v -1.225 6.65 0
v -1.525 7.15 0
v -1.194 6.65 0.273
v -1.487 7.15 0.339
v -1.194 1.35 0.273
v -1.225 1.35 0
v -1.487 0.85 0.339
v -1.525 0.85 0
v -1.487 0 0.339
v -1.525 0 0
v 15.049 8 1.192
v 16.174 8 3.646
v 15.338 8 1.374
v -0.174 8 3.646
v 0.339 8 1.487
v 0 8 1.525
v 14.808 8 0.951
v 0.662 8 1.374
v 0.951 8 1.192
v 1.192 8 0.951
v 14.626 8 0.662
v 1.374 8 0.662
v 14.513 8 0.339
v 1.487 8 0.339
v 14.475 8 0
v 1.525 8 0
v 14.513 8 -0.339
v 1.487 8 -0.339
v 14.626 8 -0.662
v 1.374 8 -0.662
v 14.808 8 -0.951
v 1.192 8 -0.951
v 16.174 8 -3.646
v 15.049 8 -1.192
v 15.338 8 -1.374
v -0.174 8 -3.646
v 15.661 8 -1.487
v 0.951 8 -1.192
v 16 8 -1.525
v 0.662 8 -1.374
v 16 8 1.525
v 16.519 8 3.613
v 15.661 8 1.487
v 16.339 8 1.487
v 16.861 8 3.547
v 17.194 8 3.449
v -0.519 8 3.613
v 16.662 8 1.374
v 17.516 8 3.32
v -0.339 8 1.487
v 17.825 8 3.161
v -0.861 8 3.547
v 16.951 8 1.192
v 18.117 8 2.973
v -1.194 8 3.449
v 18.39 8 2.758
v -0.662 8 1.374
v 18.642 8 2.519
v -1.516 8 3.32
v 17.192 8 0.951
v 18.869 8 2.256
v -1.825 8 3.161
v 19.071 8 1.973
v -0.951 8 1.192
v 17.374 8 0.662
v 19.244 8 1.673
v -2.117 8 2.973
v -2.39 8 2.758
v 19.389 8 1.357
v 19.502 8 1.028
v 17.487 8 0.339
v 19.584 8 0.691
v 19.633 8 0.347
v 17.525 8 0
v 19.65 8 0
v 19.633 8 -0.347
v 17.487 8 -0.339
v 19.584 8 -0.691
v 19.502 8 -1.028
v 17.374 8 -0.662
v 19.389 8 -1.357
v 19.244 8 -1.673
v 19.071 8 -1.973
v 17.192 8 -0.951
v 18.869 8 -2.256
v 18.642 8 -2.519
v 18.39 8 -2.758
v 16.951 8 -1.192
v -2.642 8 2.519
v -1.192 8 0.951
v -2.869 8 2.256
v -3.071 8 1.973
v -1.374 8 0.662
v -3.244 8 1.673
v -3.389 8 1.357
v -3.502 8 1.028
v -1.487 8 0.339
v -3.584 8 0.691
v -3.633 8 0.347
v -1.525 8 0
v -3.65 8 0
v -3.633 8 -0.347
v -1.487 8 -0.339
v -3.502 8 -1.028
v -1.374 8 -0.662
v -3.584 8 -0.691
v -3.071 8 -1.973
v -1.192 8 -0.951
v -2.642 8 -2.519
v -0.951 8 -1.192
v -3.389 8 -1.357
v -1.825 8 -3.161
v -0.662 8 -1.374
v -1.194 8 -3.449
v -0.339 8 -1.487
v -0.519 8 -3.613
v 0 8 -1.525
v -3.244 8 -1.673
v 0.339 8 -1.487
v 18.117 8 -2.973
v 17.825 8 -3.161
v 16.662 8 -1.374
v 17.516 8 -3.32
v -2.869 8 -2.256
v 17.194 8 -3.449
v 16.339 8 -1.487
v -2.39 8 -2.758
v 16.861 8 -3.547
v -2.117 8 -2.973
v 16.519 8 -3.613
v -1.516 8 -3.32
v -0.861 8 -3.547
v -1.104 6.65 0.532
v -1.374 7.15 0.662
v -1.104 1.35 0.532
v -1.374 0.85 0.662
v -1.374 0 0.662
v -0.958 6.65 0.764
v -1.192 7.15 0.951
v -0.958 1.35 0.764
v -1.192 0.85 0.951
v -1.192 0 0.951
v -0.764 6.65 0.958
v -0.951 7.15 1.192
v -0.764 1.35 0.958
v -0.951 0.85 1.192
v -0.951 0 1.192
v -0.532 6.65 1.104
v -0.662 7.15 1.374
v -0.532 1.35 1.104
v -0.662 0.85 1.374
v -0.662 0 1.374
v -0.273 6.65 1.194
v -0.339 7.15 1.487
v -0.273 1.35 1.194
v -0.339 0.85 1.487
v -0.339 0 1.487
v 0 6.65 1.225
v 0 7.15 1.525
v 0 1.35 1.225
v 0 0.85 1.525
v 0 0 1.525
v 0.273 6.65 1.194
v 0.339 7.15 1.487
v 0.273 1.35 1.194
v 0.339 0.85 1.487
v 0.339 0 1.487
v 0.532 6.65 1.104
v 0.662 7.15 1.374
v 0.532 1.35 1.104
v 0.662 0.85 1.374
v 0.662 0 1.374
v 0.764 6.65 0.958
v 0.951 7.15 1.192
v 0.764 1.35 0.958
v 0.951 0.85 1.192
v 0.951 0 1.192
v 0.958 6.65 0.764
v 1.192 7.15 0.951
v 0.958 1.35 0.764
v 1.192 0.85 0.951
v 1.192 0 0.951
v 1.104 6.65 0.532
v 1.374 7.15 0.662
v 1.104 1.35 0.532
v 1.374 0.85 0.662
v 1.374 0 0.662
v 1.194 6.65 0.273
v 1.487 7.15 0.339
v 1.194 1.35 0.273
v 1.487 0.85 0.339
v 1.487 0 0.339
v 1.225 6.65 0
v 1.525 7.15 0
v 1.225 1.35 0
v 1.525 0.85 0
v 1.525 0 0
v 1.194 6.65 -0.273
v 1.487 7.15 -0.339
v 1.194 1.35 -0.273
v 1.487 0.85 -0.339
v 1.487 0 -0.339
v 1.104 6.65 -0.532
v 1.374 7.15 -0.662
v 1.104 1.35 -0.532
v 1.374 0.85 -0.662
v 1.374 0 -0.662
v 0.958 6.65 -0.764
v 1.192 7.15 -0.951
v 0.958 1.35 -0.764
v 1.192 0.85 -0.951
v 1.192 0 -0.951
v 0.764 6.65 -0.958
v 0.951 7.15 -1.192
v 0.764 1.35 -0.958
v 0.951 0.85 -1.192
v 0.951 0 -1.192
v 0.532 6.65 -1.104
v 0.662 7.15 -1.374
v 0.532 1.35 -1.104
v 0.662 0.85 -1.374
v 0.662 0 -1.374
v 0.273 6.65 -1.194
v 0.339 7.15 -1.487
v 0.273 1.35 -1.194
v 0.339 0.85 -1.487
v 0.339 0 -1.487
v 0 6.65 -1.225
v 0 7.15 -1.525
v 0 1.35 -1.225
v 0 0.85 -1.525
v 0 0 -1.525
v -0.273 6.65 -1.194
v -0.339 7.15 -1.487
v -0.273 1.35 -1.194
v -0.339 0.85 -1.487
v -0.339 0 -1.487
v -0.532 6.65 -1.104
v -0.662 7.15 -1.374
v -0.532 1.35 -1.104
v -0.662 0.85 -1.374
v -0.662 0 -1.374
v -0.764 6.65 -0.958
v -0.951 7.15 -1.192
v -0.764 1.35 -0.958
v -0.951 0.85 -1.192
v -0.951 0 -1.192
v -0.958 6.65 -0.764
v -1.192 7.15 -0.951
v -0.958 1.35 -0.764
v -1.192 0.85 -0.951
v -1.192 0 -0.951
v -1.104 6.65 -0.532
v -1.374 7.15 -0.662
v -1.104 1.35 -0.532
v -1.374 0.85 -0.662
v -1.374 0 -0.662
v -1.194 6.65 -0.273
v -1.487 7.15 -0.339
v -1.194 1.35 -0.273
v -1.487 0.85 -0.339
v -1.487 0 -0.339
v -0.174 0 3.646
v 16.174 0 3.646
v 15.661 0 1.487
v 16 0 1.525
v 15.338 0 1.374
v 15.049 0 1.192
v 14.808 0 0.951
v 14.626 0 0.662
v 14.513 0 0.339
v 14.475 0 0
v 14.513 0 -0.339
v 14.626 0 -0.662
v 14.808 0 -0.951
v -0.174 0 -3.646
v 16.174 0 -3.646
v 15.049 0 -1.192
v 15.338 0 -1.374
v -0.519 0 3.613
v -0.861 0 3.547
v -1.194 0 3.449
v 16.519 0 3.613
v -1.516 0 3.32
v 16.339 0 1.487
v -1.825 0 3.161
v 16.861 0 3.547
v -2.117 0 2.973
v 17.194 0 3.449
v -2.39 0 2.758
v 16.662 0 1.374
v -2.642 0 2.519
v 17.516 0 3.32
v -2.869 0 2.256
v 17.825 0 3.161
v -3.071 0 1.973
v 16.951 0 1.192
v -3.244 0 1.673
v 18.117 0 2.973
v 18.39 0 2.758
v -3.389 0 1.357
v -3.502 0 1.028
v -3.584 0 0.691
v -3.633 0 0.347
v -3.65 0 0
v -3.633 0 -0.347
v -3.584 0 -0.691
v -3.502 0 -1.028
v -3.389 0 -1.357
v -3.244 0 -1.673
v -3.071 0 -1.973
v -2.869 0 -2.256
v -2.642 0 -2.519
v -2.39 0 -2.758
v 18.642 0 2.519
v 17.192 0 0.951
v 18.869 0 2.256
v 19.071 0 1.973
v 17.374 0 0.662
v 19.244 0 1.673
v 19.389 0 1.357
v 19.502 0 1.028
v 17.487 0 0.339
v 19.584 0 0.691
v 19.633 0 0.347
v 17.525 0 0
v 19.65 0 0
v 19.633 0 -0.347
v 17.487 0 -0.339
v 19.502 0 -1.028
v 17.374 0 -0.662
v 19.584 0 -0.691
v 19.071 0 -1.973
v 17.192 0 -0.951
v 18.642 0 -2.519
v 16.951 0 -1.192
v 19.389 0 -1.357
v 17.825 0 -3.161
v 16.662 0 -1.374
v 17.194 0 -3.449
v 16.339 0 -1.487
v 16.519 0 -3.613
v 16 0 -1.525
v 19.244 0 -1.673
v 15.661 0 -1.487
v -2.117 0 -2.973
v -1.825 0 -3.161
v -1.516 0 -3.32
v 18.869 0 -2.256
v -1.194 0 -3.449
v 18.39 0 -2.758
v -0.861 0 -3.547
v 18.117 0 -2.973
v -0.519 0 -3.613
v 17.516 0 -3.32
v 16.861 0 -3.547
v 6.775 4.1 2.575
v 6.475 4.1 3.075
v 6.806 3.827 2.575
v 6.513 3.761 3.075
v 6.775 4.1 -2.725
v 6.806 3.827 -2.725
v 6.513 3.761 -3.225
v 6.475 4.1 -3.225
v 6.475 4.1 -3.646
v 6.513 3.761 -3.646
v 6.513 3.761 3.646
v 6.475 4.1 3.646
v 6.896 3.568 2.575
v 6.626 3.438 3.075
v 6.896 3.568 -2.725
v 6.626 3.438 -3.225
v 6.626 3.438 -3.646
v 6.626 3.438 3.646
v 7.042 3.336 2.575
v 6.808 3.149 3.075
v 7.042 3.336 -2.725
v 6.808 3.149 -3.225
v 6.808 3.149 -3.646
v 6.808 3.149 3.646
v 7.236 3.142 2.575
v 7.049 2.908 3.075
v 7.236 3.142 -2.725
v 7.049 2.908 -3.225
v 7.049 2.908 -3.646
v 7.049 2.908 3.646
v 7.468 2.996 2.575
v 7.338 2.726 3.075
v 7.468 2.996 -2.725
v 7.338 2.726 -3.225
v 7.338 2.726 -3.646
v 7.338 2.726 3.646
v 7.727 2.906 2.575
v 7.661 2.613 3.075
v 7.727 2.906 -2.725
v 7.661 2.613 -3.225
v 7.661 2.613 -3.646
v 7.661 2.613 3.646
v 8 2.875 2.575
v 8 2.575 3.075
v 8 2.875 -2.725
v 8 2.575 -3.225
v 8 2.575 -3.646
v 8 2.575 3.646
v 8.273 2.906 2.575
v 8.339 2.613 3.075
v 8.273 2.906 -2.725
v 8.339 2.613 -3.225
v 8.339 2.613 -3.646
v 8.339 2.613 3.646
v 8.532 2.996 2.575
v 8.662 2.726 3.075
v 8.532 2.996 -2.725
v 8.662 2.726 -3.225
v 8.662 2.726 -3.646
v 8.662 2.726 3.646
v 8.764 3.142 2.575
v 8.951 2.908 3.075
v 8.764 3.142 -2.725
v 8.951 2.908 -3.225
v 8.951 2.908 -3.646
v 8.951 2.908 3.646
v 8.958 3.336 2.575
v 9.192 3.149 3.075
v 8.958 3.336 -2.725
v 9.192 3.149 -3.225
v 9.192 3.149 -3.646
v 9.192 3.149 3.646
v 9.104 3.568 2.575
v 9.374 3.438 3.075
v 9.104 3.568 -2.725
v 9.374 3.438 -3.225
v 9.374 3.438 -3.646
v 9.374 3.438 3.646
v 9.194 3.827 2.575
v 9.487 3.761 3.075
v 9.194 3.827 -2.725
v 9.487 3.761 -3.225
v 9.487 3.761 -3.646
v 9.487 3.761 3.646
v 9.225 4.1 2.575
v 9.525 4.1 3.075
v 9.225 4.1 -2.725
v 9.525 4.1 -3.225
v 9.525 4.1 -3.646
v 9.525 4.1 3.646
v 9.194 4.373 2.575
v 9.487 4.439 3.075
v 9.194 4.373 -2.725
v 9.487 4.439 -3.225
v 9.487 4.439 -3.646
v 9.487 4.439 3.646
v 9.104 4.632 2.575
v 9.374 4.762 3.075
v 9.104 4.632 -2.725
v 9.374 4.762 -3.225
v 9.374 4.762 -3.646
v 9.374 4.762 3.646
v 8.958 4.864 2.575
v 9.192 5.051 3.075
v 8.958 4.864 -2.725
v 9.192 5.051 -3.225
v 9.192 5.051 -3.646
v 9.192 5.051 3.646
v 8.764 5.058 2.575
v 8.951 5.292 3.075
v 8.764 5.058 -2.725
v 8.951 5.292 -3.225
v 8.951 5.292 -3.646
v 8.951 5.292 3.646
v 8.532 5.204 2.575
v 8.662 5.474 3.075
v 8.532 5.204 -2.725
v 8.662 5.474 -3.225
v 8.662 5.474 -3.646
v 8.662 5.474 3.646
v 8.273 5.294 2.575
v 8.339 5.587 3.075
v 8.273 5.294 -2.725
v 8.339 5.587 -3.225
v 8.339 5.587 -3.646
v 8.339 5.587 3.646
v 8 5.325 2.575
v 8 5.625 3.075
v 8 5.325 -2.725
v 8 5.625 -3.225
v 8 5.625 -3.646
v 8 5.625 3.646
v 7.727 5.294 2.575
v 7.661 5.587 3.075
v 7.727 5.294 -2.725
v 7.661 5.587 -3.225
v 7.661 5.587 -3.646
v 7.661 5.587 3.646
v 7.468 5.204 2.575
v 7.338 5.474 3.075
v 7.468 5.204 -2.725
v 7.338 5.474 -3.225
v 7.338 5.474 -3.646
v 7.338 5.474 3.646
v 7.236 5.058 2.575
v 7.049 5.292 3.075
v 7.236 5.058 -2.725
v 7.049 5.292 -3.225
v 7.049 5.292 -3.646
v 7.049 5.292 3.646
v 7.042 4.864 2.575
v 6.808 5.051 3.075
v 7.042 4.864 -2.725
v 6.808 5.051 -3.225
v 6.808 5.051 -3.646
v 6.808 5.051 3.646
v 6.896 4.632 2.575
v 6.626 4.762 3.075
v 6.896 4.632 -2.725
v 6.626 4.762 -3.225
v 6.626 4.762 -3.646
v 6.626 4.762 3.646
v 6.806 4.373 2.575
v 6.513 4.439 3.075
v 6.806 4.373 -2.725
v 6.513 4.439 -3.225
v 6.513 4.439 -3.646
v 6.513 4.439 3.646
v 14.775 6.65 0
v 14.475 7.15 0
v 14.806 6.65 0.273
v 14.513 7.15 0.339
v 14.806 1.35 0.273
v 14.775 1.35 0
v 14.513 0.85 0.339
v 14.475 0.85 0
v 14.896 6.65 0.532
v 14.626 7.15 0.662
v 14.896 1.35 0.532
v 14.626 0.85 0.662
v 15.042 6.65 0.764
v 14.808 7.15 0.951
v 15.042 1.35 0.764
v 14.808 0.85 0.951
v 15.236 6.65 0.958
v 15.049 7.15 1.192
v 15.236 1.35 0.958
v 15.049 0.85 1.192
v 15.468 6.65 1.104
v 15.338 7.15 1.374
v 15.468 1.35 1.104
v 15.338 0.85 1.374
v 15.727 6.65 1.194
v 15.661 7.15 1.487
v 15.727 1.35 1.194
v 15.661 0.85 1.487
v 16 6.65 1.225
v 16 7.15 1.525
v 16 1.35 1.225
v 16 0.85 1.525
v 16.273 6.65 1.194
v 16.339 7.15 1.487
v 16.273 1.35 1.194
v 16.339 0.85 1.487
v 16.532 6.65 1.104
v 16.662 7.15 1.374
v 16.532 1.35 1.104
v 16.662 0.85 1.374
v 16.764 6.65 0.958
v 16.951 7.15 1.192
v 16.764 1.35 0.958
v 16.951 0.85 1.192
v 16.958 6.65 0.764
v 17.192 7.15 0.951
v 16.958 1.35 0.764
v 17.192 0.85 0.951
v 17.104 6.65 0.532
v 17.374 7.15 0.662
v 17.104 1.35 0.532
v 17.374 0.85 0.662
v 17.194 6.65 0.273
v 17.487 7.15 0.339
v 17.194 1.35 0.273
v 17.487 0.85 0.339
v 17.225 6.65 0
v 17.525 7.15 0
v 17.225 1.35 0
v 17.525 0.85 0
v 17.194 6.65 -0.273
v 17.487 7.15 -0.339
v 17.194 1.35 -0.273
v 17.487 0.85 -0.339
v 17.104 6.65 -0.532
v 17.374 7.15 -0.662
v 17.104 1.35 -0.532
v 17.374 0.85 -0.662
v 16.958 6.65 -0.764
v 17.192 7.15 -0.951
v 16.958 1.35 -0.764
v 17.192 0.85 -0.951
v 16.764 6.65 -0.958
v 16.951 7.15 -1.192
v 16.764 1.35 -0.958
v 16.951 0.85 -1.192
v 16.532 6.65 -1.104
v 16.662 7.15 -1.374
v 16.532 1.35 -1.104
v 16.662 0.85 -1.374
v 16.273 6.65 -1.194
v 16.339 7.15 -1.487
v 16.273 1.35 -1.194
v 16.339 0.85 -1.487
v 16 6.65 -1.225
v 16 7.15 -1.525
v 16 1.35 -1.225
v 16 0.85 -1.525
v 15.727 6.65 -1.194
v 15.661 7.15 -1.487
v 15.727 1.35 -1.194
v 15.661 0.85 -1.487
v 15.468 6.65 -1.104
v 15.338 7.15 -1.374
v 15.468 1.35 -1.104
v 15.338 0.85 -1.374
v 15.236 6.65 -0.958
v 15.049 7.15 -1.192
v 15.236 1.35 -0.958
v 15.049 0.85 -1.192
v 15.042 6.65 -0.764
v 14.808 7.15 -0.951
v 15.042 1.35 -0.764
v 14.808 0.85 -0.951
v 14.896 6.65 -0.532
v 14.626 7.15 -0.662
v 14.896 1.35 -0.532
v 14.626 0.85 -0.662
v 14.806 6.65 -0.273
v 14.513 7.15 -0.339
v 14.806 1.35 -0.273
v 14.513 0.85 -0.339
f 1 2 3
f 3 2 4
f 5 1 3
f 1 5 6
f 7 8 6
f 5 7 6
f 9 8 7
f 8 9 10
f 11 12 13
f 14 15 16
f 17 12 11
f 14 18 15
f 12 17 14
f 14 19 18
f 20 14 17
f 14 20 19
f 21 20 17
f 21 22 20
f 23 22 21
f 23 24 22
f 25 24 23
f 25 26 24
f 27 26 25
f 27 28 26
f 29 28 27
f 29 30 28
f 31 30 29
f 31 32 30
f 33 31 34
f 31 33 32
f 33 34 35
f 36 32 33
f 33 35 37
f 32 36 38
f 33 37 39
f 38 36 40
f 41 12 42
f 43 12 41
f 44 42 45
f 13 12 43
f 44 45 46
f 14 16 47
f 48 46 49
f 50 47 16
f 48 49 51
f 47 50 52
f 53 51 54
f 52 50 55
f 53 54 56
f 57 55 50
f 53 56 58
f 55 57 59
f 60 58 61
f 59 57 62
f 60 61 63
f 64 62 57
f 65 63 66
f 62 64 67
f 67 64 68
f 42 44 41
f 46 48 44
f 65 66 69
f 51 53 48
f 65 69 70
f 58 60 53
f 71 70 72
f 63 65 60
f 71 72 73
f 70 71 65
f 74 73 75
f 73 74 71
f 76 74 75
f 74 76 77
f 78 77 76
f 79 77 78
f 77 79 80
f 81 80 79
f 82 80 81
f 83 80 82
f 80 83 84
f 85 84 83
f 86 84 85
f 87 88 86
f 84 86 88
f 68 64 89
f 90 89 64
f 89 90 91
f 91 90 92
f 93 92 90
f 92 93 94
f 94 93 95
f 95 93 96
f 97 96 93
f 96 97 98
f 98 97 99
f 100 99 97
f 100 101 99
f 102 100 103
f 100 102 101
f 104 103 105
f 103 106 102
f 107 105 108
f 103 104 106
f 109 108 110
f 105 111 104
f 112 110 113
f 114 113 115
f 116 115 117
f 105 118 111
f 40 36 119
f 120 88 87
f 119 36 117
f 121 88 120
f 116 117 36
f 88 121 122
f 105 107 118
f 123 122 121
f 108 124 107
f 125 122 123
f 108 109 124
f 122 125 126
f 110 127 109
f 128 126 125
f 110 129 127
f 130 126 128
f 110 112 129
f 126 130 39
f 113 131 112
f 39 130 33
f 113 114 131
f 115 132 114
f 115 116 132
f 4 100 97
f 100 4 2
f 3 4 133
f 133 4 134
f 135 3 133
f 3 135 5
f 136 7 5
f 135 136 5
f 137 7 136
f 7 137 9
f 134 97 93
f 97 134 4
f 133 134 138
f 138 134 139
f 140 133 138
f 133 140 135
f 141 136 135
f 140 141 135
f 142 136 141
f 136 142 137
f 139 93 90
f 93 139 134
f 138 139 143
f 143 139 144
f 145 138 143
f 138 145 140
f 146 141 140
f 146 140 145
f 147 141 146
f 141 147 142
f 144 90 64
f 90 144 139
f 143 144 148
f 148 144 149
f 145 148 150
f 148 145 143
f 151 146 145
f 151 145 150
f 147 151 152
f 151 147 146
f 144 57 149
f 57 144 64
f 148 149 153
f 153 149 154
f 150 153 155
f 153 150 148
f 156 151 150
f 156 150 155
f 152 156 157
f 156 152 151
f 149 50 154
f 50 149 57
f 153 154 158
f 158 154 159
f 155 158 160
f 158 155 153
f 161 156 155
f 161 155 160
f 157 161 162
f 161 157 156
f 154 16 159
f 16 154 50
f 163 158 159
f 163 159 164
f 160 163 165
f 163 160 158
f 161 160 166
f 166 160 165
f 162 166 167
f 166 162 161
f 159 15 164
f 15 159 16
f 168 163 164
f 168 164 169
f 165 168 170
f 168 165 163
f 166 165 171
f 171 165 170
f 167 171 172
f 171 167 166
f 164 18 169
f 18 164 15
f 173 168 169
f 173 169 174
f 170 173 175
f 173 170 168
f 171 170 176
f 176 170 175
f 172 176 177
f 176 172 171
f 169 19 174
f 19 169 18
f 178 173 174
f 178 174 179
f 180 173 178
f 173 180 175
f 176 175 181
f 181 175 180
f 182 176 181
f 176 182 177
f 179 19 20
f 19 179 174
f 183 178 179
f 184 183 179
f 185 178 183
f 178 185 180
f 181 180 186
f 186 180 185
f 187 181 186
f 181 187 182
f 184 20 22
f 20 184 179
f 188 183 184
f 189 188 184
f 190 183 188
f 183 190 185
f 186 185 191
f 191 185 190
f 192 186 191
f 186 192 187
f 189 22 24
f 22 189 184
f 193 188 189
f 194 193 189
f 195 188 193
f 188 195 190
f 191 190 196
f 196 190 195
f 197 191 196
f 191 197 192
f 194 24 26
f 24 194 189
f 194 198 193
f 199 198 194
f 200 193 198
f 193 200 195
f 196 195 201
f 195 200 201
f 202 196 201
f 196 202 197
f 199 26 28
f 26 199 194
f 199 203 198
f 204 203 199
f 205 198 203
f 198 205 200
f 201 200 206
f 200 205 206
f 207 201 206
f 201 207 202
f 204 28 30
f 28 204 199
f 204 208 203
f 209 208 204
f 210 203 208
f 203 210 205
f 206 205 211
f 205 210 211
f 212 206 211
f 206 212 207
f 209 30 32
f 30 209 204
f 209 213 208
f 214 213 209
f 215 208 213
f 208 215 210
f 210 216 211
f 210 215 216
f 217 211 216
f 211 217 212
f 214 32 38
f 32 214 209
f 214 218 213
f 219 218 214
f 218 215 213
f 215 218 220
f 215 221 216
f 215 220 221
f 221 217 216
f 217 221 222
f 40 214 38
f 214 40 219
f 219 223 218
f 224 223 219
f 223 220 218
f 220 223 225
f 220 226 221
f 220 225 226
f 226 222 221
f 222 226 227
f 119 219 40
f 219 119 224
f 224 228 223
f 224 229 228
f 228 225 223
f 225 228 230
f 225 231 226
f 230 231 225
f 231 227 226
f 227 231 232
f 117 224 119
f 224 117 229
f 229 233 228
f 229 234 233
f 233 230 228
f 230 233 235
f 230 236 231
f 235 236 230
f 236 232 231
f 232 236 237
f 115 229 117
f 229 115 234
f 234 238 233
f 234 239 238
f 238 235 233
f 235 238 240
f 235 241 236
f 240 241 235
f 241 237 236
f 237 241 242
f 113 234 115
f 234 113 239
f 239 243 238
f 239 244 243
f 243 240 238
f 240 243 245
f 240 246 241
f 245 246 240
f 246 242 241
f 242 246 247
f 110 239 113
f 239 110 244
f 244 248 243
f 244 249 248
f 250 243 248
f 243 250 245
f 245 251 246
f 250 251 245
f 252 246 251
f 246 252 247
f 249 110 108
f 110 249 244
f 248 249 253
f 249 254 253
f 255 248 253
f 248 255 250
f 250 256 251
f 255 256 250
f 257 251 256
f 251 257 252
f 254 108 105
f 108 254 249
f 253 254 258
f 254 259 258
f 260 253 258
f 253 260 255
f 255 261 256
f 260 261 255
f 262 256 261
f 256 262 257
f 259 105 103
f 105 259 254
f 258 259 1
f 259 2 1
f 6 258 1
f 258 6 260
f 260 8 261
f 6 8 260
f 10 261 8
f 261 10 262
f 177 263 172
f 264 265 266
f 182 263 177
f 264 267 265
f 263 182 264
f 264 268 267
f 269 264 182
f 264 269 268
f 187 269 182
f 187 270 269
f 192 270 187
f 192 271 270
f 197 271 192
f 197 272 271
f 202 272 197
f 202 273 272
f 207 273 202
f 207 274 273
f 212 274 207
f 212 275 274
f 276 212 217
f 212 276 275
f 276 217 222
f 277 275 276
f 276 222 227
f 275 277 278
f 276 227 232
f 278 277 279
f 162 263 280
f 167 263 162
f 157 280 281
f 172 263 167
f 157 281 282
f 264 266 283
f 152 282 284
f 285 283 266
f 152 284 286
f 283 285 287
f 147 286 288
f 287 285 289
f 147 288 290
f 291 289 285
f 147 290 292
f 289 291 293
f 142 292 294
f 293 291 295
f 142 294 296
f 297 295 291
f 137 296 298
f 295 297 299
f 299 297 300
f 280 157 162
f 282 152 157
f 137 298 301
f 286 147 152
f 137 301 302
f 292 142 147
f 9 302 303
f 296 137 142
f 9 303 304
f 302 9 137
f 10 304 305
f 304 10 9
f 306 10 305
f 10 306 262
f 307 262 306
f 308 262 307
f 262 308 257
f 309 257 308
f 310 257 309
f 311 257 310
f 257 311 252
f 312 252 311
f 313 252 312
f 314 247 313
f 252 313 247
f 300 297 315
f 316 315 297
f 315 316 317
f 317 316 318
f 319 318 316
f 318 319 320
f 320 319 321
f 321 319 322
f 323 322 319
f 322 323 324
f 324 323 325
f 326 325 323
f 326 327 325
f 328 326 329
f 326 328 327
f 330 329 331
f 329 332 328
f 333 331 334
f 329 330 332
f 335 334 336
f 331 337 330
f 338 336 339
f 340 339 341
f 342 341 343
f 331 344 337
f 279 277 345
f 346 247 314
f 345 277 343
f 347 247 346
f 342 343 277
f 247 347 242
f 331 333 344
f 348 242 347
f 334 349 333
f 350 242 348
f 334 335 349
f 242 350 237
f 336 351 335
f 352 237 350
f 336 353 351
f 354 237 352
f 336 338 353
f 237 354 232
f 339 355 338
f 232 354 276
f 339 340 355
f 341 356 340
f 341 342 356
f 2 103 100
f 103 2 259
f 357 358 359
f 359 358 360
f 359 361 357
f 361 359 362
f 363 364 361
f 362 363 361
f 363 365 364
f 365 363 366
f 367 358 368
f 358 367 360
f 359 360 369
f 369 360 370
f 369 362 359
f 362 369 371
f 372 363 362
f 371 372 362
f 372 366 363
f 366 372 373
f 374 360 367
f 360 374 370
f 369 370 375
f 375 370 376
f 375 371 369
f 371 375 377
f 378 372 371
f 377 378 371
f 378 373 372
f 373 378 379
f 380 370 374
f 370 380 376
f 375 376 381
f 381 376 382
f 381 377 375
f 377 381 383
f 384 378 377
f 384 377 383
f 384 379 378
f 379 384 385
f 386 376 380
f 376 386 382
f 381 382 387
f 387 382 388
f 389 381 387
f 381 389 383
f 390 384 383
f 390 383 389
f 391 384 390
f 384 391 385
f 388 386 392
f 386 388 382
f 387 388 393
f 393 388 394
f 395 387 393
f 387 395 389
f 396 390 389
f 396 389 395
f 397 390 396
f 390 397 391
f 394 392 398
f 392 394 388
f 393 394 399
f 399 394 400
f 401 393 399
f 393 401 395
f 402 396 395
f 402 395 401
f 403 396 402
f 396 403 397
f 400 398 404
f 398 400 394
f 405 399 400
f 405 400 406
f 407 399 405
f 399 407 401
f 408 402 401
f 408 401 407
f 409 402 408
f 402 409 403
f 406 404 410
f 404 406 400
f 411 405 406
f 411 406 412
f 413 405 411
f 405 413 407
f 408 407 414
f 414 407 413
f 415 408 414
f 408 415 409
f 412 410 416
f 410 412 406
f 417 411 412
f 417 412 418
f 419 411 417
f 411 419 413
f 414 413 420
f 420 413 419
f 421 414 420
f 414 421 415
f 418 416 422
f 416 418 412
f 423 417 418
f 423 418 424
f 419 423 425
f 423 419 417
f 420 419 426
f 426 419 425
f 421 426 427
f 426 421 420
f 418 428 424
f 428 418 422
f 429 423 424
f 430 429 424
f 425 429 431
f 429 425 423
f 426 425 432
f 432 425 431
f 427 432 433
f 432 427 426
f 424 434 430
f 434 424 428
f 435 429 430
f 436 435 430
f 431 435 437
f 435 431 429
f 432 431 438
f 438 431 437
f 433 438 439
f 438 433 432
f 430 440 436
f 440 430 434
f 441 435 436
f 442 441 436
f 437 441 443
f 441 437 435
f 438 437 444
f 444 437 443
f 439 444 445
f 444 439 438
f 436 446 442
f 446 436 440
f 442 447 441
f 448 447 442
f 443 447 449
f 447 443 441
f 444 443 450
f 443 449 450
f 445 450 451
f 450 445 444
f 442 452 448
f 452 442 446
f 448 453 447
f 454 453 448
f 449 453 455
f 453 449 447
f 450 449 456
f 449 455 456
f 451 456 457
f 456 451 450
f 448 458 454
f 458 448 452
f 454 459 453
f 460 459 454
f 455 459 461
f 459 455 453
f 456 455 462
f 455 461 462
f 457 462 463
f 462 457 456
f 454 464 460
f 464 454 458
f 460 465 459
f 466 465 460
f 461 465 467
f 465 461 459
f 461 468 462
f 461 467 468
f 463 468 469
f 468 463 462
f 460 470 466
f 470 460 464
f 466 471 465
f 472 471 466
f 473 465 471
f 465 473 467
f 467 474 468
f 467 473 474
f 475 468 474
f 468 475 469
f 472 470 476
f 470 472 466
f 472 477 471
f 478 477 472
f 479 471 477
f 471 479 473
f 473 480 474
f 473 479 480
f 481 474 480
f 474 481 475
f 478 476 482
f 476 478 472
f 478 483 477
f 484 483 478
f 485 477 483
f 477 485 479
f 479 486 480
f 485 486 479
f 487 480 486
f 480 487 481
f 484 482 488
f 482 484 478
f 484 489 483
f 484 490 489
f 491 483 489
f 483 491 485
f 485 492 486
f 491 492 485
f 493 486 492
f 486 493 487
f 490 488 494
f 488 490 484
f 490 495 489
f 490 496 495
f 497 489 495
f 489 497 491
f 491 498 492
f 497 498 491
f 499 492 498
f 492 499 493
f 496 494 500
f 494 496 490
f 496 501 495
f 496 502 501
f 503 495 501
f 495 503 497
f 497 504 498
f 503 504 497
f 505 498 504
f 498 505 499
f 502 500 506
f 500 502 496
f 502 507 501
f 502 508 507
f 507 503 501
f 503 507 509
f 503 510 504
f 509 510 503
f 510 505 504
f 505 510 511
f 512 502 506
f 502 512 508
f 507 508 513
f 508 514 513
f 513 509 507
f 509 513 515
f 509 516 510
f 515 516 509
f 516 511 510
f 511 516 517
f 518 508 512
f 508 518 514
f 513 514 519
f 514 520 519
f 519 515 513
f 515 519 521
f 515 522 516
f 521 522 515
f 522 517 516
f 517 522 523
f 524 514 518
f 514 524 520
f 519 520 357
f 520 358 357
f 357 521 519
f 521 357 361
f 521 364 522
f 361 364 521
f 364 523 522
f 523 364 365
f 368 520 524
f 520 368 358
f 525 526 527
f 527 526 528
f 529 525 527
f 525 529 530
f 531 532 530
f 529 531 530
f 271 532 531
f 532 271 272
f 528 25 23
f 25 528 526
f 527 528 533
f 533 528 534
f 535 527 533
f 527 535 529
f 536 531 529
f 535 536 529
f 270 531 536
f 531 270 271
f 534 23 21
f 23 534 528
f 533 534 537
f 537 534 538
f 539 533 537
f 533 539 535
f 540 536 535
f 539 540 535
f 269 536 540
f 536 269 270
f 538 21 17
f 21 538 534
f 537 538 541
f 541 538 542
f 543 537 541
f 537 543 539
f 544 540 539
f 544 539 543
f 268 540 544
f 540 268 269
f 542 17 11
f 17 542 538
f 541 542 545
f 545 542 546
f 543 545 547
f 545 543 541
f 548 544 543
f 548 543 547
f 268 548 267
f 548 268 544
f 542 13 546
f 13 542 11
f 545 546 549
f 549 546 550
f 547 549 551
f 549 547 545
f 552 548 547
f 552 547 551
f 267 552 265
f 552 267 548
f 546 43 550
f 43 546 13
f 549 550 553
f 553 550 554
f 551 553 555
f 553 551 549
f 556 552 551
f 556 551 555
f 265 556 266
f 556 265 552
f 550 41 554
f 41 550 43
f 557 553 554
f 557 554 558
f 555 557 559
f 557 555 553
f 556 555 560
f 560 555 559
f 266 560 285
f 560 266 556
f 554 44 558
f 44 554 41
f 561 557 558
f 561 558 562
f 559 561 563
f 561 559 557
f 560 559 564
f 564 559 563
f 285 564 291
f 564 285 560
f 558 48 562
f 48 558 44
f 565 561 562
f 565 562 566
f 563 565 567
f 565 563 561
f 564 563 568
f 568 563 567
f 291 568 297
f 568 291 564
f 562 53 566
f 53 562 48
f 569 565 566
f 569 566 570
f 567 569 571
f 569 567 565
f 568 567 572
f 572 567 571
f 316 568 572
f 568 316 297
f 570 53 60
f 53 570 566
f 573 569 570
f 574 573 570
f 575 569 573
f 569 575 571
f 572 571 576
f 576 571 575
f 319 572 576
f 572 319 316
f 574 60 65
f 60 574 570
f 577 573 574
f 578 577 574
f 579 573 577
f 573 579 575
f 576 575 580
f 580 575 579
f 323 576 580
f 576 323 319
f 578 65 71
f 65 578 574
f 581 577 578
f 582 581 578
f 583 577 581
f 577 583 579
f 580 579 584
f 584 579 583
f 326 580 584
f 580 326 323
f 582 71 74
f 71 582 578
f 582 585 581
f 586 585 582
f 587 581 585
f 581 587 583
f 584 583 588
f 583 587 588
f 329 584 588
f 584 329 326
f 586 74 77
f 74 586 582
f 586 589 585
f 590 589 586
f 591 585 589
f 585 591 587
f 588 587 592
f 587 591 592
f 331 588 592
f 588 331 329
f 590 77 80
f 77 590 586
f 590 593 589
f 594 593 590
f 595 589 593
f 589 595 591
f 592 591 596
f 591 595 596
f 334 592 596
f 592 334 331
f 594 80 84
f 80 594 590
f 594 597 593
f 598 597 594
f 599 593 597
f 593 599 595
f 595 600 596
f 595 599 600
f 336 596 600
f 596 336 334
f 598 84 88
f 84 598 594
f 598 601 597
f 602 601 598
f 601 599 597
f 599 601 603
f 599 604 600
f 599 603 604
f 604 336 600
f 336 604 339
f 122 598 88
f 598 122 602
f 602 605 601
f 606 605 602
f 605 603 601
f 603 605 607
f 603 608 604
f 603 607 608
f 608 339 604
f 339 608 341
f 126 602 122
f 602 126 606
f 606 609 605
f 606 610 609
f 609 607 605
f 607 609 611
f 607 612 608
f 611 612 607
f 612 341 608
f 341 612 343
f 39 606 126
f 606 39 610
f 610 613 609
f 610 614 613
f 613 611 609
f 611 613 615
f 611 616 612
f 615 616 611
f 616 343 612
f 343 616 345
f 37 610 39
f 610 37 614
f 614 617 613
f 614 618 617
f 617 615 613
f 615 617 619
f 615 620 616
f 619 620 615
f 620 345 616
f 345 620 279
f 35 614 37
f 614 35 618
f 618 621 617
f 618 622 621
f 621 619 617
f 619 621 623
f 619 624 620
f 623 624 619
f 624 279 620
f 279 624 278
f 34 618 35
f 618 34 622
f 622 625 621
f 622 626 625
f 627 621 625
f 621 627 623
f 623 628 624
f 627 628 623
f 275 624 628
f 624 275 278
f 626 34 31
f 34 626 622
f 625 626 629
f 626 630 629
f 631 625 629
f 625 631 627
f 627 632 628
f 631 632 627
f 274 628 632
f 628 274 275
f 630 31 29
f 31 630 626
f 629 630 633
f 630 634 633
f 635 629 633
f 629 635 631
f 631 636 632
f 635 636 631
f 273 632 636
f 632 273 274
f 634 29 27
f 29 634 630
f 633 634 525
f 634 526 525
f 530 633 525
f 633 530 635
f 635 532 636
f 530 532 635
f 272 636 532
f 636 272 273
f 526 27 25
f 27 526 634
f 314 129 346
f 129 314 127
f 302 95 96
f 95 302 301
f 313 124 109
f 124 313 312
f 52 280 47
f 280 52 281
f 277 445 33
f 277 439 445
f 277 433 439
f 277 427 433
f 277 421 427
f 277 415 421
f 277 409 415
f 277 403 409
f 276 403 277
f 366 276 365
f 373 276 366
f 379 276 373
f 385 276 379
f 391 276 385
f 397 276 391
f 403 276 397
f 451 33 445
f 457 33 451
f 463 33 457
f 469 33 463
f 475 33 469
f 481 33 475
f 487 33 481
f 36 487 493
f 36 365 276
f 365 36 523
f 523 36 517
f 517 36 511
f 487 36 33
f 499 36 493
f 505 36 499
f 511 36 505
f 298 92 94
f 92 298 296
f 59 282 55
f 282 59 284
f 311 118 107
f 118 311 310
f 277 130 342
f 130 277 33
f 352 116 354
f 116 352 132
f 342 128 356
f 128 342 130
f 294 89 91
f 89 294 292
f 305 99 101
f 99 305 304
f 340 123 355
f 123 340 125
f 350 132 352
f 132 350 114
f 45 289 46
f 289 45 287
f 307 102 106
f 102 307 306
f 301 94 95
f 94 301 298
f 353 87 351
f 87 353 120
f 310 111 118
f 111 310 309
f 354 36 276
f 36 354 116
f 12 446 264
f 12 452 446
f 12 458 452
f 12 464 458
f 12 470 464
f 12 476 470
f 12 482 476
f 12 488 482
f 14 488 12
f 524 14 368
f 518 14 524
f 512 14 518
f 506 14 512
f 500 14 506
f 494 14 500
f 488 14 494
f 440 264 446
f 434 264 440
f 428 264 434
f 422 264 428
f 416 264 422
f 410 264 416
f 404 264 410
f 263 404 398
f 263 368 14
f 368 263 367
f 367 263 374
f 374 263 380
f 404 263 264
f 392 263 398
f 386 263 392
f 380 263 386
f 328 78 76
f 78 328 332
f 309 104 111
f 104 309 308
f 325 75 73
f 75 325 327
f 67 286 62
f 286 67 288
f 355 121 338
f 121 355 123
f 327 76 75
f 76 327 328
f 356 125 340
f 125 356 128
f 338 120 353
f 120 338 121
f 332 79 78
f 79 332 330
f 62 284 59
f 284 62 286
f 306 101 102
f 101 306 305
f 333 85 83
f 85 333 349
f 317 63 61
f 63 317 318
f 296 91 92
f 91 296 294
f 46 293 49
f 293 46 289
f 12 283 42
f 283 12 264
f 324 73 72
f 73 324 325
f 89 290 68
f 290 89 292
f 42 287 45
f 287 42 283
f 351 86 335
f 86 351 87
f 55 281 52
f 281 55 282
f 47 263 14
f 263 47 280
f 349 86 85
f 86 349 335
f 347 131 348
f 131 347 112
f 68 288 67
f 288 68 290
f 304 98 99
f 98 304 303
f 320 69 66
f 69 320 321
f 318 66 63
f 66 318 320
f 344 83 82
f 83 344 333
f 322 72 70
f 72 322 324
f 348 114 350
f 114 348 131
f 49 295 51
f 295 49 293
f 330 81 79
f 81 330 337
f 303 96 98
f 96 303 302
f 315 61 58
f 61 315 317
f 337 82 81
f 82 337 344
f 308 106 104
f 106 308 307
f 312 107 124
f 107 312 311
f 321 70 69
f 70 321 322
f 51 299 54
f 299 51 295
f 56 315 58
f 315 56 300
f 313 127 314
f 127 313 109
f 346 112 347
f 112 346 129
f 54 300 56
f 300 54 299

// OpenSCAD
/*      
        Even More Customizable Straight LEGO Technic Beam
        Based on Customizable Straight LEGO Technic Beam
         and Parametric LEGO Technic Beam by "projunk" and "stevemedwin"
        
        www.thingiverse.com/thing:203935
        
        Also uploaded to Prusaprinters.org at https://www.prusaprinters.org/prints/33038-even-more-customizable-straight-beam-for-legotm-te
        
        Modified by Sam Kass
        November 2015

		Modified by Orso Eric (2024-03)	
		https://github.com/OrsoEric/OpenSCAD-lego-library
*/

// user parameters

//Hole sequence
//o for round hole
//+ for plus-shaped hole
//capital O for sideways hole
//capital P for sideways plus
//and x for blank spot.
//eg. lego_beam("+xPOo");

cn_lego_pitch_stud = 8.0;
cn_lego_drill_small = 4.9/2;
cn_lego_drill_large = 6.1/2;
cn_lego_height_beam = 7.8;

cn_lego_width_beam = 7.3; 
cn_lego_drill_axel = 2.0;

//How deep the shriking of the big hole
cn_lego_drill_depth_indent = 0.85;
//How steep the transition from big hole to small hole
cn_lego_drill_sharpness = 0.5;

module body( in_length_stud, in_height = cn_lego_height_beam, in_precision = 0.5 )
{
    translate([0, cn_lego_width_beam/2, 0]) 
    hull()
	{
        cylinder(r=cn_lego_width_beam/2, h=in_height,$fa = 0.1+in_precision, $fs = 0.1+in_precision/2);    
        translate([(in_length_stud-1)*cn_lego_pitch_stud, 0, 0]) 
            cylinder(r=cn_lego_width_beam/2, h=in_height,$fa = 0.1+in_precision, $fs = 0.1+in_precision/2);
    }
}

module hole( in_height = cn_lego_height_beam, in_precision = 0.5 )
{
	an_cross_section = [
		//Bottom
		[0,0],
		//Top
		[0,in_height],
		//Top Big hole
		[cn_lego_drill_large/2,in_height],
		[cn_lego_drill_large/2,in_height-cn_lego_drill_depth_indent],
		//Top Small Hole
		[cn_lego_drill_small/2,in_height-cn_lego_drill_depth_indent-cn_lego_drill_sharpness],
		//Bottom Small hole
		[cn_lego_drill_small/2,cn_lego_drill_depth_indent+cn_lego_drill_sharpness],
		//Bottom Big Hole
		[cn_lego_drill_large/2,cn_lego_drill_depth_indent],
		[cn_lego_drill_large/2,0]
	];
	//Rotate the cross section of the hole around its axis, to generate the hole
	rotate_extrude($fa = 0.1+in_precision, $fs = 0.1+in_precision/2)
	polygon(an_cross_section);
}

module plus( in_height = cn_lego_height_beam )
{
    union()
	{
        translate([-cn_lego_drill_axel/2, -cn_lego_drill_small, 0]) 
            cube([cn_lego_drill_axel, cn_lego_drill_small*2, in_height]);

        translate([-cn_lego_drill_small, -cn_lego_drill_axel/2, 0]) 
            cube([cn_lego_drill_small*2, cn_lego_drill_axel, in_height]);
    }
}

module lego_beam( is_holes, in_height = cn_lego_height_beam  )
{
	//number of studs
	in_length = len(is_holes);

	if (in_length > 0)
	{
		//Center the beam
		translate([0,cn_lego_pitch_stud,0])
		rotate([90,0,0])
		difference()
		{
			body( in_length, in_height );
			for (i = [1:in_length])
			{
				if (is_holes[i-1] == "+")
					translate([(i-1)*cn_lego_pitch_stud, cn_lego_width_beam/2, 0])
						plus( in_height );
				else if (is_holes[i-1] == "o")
					translate([(i-1)*cn_lego_pitch_stud, cn_lego_width_beam/2, 0])
						hole( in_height );
				else if (is_holes[i-1] == "O")
					rotate([90,0,0])
					translate([(i-1)*cn_lego_pitch_stud, cn_lego_height_beam/2,-cn_lego_pitch_stud+cn_lego_drill_depth_indent/2])
						hole( in_height );
				else if (is_holes[i-1] == "P")
					rotate([90,0,0])
					translate([(i-1)*cn_lego_pitch_stud, cn_lego_height_beam/2,-cn_lego_pitch_stud+cn_lego_drill_depth_indent/2])
						plus( in_height );
				else 
				{
					//no drill, leave a blank space
				}
			}
		}
	}
}

//Get an array of string, each will become a beam
//E.g. lego_plate(["o+Po", "oPOo", "oP+o"]);
// o+Po
// oPOo
// oP+o
module lego_plate( ias_pattern )
{
	//number of beams side to side
	in_width_stud = len(ias_pattern);

    for (cnt = [0:in_width_stud-1])
    {
        translate([0,cn_lego_pitch_stud*cnt,-0.5*cn_lego_width_beam])
            lego_beam(ias_pattern[cnt], cn_lego_pitch_stud);
    }
}

//Same as lego_plate, but slices along width, not length
//It's easier to make patterns on plates this way
//E.g. lego_plate(["ooo", "+PP", "PO+","ooo"]);
module lego_plate_alternate(ias_pattern)
{
    // number of beams side to side
    in_width_stud = len(ias_pattern[0]); // assuming all strings are of the same length
	in_length_stud = len(ias_pattern);
	echo("Length: ",in_length_stud, "cn_lego_width_beam: ", in_width_stud);
    for (cnt = [0:in_width_stud-1])
    {
        ac_array = [for(i = [0:in_length_stud-1]) ias_pattern[i][cnt]];
		echo( "Beam:", cnt, "Pattern:", ac_array );
        translate([0,cn_lego_pitch_stud*cnt,-0.5*cn_lego_width_beam])
            lego_beam(ac_array, cn_lego_pitch_stud);
    }
}
lego_plate_alternate
([
	"o",
	"O",
	"o",
]);

//lego_plate_alternate(["ooo", "+++", "POP", "ooo"]);
